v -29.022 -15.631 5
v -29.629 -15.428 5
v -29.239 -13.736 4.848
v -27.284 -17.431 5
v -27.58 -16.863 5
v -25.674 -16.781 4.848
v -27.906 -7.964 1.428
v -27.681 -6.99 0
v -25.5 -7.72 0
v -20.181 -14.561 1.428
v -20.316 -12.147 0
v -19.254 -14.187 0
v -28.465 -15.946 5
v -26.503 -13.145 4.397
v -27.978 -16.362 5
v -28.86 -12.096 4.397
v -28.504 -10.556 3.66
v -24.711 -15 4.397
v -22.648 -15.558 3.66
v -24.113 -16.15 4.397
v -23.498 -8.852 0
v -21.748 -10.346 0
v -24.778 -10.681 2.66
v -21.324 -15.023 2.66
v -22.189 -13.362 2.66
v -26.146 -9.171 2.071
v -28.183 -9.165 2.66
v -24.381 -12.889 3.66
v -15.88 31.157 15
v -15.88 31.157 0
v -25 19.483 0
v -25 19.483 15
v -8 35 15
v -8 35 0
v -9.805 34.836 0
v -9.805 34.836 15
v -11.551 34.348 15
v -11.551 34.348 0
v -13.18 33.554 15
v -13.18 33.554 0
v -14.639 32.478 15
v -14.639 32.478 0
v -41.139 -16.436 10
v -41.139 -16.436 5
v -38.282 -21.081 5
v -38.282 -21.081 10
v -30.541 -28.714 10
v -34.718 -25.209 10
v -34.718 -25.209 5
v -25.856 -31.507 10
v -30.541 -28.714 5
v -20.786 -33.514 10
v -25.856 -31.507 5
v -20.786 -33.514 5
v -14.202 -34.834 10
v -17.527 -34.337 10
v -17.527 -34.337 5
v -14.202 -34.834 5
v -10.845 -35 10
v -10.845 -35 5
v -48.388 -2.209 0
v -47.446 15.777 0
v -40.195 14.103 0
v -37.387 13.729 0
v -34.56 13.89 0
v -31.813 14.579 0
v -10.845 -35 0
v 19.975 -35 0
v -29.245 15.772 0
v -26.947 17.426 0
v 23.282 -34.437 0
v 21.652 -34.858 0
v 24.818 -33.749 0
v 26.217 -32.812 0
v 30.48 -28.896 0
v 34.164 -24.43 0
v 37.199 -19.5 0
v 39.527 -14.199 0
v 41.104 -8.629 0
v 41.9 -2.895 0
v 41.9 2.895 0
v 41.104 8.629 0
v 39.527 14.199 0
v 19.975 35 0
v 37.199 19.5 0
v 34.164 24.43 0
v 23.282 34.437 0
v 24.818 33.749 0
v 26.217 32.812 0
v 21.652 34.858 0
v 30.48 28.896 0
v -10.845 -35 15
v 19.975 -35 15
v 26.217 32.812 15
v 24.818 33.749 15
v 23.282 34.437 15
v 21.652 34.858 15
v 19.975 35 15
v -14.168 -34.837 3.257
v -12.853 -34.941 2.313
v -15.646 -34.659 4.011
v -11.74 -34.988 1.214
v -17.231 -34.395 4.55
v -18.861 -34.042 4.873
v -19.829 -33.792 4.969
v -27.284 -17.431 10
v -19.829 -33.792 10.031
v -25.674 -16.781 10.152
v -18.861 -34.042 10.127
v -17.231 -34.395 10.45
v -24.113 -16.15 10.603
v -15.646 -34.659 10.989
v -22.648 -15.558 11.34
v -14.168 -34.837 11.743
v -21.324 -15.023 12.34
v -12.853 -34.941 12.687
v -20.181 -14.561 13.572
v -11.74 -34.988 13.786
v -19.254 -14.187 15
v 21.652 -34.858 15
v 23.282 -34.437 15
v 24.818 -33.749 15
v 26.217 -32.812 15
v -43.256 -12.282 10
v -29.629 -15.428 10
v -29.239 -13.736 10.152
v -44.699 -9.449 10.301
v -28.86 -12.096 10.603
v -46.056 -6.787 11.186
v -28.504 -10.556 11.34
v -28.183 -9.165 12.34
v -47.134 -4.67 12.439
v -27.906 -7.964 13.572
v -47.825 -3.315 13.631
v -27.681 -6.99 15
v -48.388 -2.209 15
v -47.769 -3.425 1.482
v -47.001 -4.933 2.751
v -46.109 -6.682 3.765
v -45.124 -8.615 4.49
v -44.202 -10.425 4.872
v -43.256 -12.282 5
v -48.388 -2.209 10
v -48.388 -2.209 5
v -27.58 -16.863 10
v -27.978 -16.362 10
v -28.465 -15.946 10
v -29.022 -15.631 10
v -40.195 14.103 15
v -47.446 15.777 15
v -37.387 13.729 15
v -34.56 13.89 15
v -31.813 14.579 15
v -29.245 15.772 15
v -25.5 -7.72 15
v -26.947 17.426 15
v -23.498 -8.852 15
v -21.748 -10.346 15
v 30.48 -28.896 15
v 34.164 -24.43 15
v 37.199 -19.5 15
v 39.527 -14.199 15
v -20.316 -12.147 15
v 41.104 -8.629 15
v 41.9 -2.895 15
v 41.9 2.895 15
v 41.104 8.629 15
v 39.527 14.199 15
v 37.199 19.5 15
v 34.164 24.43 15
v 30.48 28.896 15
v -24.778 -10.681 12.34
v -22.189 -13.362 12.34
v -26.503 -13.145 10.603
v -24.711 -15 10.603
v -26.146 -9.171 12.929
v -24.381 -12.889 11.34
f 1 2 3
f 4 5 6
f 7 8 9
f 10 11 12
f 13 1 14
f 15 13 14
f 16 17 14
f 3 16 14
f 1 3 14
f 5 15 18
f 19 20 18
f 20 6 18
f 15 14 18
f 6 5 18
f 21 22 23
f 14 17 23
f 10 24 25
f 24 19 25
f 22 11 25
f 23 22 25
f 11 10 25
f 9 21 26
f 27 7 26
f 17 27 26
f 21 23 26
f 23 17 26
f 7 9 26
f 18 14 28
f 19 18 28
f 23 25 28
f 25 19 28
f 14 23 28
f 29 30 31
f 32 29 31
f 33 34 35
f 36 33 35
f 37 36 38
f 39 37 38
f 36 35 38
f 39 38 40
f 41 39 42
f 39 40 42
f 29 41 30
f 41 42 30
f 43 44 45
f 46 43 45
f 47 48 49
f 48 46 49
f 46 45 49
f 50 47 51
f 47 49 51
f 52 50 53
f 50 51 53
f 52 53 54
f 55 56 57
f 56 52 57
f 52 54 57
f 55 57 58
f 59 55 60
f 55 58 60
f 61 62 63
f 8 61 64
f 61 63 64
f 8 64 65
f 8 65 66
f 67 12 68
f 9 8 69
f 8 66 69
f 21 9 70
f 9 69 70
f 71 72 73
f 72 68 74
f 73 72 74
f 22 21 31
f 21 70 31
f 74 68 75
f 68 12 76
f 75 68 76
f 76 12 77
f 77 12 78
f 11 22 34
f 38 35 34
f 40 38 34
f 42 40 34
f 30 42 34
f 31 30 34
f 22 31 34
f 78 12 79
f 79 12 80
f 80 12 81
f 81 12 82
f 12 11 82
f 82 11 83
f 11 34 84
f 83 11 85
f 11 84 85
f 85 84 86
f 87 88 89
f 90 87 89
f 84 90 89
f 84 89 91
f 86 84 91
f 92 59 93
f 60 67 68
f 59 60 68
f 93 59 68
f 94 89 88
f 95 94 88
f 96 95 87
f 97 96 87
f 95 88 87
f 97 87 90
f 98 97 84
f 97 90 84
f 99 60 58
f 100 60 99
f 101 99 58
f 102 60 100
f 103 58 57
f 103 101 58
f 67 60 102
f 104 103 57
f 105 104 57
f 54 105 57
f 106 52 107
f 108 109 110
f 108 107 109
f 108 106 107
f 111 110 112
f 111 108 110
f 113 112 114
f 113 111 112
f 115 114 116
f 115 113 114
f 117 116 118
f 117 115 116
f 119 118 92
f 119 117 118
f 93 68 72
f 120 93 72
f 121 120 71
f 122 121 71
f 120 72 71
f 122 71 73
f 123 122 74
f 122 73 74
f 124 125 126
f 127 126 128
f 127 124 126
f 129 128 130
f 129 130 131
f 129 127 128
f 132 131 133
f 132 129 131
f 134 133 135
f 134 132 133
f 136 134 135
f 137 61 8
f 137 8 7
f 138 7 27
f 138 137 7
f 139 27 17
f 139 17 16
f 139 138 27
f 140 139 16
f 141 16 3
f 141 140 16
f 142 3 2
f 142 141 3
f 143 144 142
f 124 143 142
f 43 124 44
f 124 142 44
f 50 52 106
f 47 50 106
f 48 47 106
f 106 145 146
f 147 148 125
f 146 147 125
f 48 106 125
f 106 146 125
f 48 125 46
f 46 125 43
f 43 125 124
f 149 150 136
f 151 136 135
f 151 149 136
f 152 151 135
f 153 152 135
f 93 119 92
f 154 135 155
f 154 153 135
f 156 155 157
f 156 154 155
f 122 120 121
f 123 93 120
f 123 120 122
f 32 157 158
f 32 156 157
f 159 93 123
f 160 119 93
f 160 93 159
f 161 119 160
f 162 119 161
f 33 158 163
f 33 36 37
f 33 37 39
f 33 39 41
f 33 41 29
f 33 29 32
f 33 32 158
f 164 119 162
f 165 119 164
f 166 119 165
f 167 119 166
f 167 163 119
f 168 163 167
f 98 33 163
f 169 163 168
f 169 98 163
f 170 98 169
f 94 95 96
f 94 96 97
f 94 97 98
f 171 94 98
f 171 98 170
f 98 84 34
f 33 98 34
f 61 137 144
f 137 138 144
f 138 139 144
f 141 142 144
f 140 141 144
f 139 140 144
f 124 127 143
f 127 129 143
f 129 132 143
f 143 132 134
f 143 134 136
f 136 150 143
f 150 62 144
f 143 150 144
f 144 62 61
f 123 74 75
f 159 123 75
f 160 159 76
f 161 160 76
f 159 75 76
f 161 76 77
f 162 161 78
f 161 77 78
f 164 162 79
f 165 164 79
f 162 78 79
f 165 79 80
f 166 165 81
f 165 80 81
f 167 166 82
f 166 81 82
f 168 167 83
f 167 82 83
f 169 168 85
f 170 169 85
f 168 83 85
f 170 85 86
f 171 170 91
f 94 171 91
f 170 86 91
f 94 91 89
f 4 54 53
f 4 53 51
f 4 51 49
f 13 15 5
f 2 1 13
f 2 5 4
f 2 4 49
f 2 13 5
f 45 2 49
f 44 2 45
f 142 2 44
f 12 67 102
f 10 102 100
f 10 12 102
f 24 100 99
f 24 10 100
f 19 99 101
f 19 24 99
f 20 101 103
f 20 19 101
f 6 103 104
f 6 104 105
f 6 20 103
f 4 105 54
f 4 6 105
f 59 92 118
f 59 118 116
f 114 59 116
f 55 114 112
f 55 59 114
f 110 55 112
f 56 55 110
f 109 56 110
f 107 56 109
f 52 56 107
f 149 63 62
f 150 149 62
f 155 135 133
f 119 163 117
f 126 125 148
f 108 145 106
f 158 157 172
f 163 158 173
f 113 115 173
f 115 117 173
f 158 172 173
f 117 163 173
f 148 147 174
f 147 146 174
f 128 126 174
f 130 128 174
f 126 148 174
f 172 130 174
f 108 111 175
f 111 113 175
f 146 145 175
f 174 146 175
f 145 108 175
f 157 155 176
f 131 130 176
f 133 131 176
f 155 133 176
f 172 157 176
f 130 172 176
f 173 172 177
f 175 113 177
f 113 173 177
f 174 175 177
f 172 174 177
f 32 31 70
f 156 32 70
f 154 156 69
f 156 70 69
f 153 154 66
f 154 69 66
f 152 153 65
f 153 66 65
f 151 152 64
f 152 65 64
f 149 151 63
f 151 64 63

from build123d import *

# Parameters (mm, degrees)
BOSS_EXTRUDE1_DEPTH   = 15
CORTE_EXTRUS_O1_DEPTH = 5
CORTE_EXTRUS_O2_START = -10
CORTE_EXTRUS_O2_DEPTH = 5
FILETE1_R             = 10


with BuildPart() as part:
    # Sketch2 → Boss-Extrude1 (new body)
    with BuildSketch(Plane.XY):
        with BuildLine():
            Line((-40.19459236, 14.102844367), (-47.445652556, 15.776883518))
            Line((-47.445652556, 15.776883518), (-48.388260059, -2.209139093))
            Line((-48.388260059, -2.209139093), (-41.139476942, -16.435676991))
            ThreePointArc((-41.139476942, -16.435676991), (-28.61020632, -29.989765588), (-10.845255119, -35))
            Line((-10.845255119, -35), (-8, -35))
            Line((-8, -35), (19.974984355, -35))
            ThreePointArc((19.974984355, -35), (23.282173494, -34.437293044), (26.217166967, -32.8125))
            ThreePointArc((26.217166967, -32.8125), (42, 0), (26.217166967, 32.8125))
            ThreePointArc((26.217166967, 32.8125), (23.282173494, 34.437293044), (19.974984355, 35))
            Line((19.974984355, 35), (-8, 35))
            ThreePointArc((-8, 35), (-12.383711468, 33.987940463), (-15.880107536, 31.156614753))
            Line((-15.880107536, 31.156614753), (-25.000165241, 19.483473209))
            ThreePointArc((-25.000165241, 19.483473209), (-31.813223657, 14.578772972), (-40.19459236, 14.102844367))
        make_face()
    extrude(amount=BOSS_EXTRUDE1_DEPTH)

    # Esboço4 → Corte-extrusão1 (cut)
    with BuildSketch(Plane(origin=(0, 0, 0), x_dir=(-1, 0, 0), z_dir=(0, 0, -1))):
        with BuildLine():
            Line((48.388260059, -2.209139093), (27.681074333, -6.989769605))
            ThreePointArc((27.681074333, -6.989769605), (22.587110405, -9.557338795), (19.25428073, -14.186931261))
            Line((19.25428073, -14.186931261), (10.845255119, -35))
            ThreePointArc((10.845255119, -35), (28.61020632, -29.989765588), (41.139476942, -16.435676991))
            Line((41.139476942, -16.435676991), (48.388260059, -2.209139093))
        make_face()
    extrude(amount=-CORTE_EXTRUS_O1_DEPTH, mode=Mode.SUBTRACT)

    # Esboço4<2> → Corte-extrusão2 (cut)
    with BuildSketch(Plane(origin=(0, 0, 0), x_dir=(-1, 0, 0), z_dir=(0, 0, -1)).offset(CORTE_EXTRUS_O2_START)):
        with BuildLine():
            Line((48.388260059, -2.209139093), (27.681074333, -6.989769605))
            ThreePointArc((27.681074333, -6.989769605), (22.587110405, -9.557338795), (19.25428073, -14.186931261))
            Line((19.25428073, -14.186931261), (10.845255119, -35))
            ThreePointArc((10.845255119, -35), (28.61020632, -29.989765588), (41.139476942, -16.435676991))
            Line((41.139476942, -16.435676991), (48.388260059, -2.209139093))
        make_face()
    extrude(amount=-CORTE_EXTRUS_O2_DEPTH, mode=Mode.SUBTRACT)

    # Filete1
    # the kernel refuses this fillet: 10 mm, written as the material it adds along each edge
    with BuildSketch(Plane(origin=(-19.25428073, -14.186931261, 10), x_dir=(0, 0, 1), z_dir=(0.3746065934159196, -0.9271838545667843, 0))) as filete1_piece_1_section:
        with BuildLine():
            CenterArc((10, 8.660254038), FILETE1_R, 180, 60)
            Line((0, 8.660254038), (0, 0))
            Line((0, 0), (5, 0))
        make_face()
    filete1_piece_1 = extrude(amount=44.098252831, mode=Mode.PRIVATE)
    filete1_piece_1 = filete1_piece_1 & Plane(origin=(-10.845255119, -1, 11.322425454), x_dir=(-0.891006524188372, -0.4539904997395388, 0), z_dir=(0, 0, -1)) * Cylinder(34, 123, mode=Mode.PRIVATE)
    add(filete1_piece_1)
    with BuildSketch(Plane(origin=(-69.483990779, 2.661194099, 10), x_dir=(0, 0, 1), z_dir=(0.9743700647852346, -0.2249510543438682, 0))) as filete1_piece_2_section:
        with BuildLine():
            CenterArc((10, 8.660254038), FILETE1_R, 180, 60)
            Line((0, 8.660254038), (0, 0))
            Line((0, 0), (5, 0))
        make_face()
    filete1_piece_2 = extrude(amount=42.902504867, mode=Mode.PRIVATE)
    filete1_piece_2 = split(filete1_piece_2, bisect_by=Plane(origin=(-44.017931787, -10.786391272, 11.322425454), z_dir=(0.8910065241883723, 0.4539904997395381, 0)), keep=Keep.TOP, mode=Mode.PRIVATE)
    add(filete1_piece_2)
    with BuildSketch(Plane(origin=(-69.483990779, 2.661194099, 5), x_dir=(0, 0, -1), z_dir=(0.9743700647852346, -0.2249510543438682, 0))) as filete1_piece_3_section:
        with BuildLine():
            CenterArc((10, -8.660254038), FILETE1_R, 120, 60)
            Line((0, -8.660254038), (0, 0))
            Line((0, 0), (5, 0))
        make_face()
    filete1_piece_3 = extrude(amount=42.902504867, mode=Mode.PRIVATE)
    filete1_piece_3 = split(filete1_piece_3, bisect_by=Plane(origin=(-44.017931791, -10.786391265, 3.677574546), z_dir=(0.8910065241883723, 0.4539904997395381, 0)), keep=Keep.TOP, mode=Mode.PRIVATE)
    add(filete1_piece_3)
    with BuildSketch(Plane(origin=(-19.25428073, -14.186931261, 5), x_dir=(0, 0, -1), z_dir=(0.3746065934159196, -0.9271838545667843, 0))) as filete1_piece_4_section:
        with BuildLine():
            CenterArc((10, -8.660254038), FILETE1_R, 120, 60)
            Line((0, -8.660254038), (0, 0))
            Line((0, 0), (5, 0))
        make_face()
    filete1_piece_4 = extrude(amount=44.098252831, mode=Mode.PRIVATE)
    filete1_piece_4 = filete1_piece_4 & Plane(origin=(-10.845255119, -1, 3.677574546), x_dir=(-0.891006524188372, -0.4539904997395388, 0), z_dir=(0, 0, -1)) * Cylinder(34, 123, mode=Mode.PRIVATE)
    add(filete1_piece_4)
    with BuildSketch(Plane(origin=(-30.380486985, -18.682210382, 10), x_dir=(0.22495105434386828, 0.9743700647852345, 0), z_dir=(-0.9743700647852345, 0.22495105434386828, 0))) as filete1_piece_5:
        with BuildLine():
            CenterArc((3.339745962, -10), FILETE1_R, 30, 60)
            Line((3.339745962, 0), (12, 0))
            Line((12, 0), (12, -5))
        make_face()
    revolve(axis=Axis((-30.380486985, -18.682210382, 10), (0, 0, -1)), revolution_arc=55)
    with BuildSketch(Plane(origin=(-30.380486985, -18.682210382, 5), x_dir=(0.22495105434386828, 0.9743700647852345, 0), z_dir=(-0.9743700647852345, 0.22495105434386828, 0))) as filete1_piece_6:
        with BuildLine():
            CenterArc((3.339745962, 10), FILETE1_R, 270, 60)
            Line((3.339745962, 0), (12, 0))
            Line((12, 0), (12, 5))
        make_face()
    revolve(axis=Axis((-30.380486985, -18.682210382, 5), (0, 0, -1)), revolution_arc=55)


solid = part.part
